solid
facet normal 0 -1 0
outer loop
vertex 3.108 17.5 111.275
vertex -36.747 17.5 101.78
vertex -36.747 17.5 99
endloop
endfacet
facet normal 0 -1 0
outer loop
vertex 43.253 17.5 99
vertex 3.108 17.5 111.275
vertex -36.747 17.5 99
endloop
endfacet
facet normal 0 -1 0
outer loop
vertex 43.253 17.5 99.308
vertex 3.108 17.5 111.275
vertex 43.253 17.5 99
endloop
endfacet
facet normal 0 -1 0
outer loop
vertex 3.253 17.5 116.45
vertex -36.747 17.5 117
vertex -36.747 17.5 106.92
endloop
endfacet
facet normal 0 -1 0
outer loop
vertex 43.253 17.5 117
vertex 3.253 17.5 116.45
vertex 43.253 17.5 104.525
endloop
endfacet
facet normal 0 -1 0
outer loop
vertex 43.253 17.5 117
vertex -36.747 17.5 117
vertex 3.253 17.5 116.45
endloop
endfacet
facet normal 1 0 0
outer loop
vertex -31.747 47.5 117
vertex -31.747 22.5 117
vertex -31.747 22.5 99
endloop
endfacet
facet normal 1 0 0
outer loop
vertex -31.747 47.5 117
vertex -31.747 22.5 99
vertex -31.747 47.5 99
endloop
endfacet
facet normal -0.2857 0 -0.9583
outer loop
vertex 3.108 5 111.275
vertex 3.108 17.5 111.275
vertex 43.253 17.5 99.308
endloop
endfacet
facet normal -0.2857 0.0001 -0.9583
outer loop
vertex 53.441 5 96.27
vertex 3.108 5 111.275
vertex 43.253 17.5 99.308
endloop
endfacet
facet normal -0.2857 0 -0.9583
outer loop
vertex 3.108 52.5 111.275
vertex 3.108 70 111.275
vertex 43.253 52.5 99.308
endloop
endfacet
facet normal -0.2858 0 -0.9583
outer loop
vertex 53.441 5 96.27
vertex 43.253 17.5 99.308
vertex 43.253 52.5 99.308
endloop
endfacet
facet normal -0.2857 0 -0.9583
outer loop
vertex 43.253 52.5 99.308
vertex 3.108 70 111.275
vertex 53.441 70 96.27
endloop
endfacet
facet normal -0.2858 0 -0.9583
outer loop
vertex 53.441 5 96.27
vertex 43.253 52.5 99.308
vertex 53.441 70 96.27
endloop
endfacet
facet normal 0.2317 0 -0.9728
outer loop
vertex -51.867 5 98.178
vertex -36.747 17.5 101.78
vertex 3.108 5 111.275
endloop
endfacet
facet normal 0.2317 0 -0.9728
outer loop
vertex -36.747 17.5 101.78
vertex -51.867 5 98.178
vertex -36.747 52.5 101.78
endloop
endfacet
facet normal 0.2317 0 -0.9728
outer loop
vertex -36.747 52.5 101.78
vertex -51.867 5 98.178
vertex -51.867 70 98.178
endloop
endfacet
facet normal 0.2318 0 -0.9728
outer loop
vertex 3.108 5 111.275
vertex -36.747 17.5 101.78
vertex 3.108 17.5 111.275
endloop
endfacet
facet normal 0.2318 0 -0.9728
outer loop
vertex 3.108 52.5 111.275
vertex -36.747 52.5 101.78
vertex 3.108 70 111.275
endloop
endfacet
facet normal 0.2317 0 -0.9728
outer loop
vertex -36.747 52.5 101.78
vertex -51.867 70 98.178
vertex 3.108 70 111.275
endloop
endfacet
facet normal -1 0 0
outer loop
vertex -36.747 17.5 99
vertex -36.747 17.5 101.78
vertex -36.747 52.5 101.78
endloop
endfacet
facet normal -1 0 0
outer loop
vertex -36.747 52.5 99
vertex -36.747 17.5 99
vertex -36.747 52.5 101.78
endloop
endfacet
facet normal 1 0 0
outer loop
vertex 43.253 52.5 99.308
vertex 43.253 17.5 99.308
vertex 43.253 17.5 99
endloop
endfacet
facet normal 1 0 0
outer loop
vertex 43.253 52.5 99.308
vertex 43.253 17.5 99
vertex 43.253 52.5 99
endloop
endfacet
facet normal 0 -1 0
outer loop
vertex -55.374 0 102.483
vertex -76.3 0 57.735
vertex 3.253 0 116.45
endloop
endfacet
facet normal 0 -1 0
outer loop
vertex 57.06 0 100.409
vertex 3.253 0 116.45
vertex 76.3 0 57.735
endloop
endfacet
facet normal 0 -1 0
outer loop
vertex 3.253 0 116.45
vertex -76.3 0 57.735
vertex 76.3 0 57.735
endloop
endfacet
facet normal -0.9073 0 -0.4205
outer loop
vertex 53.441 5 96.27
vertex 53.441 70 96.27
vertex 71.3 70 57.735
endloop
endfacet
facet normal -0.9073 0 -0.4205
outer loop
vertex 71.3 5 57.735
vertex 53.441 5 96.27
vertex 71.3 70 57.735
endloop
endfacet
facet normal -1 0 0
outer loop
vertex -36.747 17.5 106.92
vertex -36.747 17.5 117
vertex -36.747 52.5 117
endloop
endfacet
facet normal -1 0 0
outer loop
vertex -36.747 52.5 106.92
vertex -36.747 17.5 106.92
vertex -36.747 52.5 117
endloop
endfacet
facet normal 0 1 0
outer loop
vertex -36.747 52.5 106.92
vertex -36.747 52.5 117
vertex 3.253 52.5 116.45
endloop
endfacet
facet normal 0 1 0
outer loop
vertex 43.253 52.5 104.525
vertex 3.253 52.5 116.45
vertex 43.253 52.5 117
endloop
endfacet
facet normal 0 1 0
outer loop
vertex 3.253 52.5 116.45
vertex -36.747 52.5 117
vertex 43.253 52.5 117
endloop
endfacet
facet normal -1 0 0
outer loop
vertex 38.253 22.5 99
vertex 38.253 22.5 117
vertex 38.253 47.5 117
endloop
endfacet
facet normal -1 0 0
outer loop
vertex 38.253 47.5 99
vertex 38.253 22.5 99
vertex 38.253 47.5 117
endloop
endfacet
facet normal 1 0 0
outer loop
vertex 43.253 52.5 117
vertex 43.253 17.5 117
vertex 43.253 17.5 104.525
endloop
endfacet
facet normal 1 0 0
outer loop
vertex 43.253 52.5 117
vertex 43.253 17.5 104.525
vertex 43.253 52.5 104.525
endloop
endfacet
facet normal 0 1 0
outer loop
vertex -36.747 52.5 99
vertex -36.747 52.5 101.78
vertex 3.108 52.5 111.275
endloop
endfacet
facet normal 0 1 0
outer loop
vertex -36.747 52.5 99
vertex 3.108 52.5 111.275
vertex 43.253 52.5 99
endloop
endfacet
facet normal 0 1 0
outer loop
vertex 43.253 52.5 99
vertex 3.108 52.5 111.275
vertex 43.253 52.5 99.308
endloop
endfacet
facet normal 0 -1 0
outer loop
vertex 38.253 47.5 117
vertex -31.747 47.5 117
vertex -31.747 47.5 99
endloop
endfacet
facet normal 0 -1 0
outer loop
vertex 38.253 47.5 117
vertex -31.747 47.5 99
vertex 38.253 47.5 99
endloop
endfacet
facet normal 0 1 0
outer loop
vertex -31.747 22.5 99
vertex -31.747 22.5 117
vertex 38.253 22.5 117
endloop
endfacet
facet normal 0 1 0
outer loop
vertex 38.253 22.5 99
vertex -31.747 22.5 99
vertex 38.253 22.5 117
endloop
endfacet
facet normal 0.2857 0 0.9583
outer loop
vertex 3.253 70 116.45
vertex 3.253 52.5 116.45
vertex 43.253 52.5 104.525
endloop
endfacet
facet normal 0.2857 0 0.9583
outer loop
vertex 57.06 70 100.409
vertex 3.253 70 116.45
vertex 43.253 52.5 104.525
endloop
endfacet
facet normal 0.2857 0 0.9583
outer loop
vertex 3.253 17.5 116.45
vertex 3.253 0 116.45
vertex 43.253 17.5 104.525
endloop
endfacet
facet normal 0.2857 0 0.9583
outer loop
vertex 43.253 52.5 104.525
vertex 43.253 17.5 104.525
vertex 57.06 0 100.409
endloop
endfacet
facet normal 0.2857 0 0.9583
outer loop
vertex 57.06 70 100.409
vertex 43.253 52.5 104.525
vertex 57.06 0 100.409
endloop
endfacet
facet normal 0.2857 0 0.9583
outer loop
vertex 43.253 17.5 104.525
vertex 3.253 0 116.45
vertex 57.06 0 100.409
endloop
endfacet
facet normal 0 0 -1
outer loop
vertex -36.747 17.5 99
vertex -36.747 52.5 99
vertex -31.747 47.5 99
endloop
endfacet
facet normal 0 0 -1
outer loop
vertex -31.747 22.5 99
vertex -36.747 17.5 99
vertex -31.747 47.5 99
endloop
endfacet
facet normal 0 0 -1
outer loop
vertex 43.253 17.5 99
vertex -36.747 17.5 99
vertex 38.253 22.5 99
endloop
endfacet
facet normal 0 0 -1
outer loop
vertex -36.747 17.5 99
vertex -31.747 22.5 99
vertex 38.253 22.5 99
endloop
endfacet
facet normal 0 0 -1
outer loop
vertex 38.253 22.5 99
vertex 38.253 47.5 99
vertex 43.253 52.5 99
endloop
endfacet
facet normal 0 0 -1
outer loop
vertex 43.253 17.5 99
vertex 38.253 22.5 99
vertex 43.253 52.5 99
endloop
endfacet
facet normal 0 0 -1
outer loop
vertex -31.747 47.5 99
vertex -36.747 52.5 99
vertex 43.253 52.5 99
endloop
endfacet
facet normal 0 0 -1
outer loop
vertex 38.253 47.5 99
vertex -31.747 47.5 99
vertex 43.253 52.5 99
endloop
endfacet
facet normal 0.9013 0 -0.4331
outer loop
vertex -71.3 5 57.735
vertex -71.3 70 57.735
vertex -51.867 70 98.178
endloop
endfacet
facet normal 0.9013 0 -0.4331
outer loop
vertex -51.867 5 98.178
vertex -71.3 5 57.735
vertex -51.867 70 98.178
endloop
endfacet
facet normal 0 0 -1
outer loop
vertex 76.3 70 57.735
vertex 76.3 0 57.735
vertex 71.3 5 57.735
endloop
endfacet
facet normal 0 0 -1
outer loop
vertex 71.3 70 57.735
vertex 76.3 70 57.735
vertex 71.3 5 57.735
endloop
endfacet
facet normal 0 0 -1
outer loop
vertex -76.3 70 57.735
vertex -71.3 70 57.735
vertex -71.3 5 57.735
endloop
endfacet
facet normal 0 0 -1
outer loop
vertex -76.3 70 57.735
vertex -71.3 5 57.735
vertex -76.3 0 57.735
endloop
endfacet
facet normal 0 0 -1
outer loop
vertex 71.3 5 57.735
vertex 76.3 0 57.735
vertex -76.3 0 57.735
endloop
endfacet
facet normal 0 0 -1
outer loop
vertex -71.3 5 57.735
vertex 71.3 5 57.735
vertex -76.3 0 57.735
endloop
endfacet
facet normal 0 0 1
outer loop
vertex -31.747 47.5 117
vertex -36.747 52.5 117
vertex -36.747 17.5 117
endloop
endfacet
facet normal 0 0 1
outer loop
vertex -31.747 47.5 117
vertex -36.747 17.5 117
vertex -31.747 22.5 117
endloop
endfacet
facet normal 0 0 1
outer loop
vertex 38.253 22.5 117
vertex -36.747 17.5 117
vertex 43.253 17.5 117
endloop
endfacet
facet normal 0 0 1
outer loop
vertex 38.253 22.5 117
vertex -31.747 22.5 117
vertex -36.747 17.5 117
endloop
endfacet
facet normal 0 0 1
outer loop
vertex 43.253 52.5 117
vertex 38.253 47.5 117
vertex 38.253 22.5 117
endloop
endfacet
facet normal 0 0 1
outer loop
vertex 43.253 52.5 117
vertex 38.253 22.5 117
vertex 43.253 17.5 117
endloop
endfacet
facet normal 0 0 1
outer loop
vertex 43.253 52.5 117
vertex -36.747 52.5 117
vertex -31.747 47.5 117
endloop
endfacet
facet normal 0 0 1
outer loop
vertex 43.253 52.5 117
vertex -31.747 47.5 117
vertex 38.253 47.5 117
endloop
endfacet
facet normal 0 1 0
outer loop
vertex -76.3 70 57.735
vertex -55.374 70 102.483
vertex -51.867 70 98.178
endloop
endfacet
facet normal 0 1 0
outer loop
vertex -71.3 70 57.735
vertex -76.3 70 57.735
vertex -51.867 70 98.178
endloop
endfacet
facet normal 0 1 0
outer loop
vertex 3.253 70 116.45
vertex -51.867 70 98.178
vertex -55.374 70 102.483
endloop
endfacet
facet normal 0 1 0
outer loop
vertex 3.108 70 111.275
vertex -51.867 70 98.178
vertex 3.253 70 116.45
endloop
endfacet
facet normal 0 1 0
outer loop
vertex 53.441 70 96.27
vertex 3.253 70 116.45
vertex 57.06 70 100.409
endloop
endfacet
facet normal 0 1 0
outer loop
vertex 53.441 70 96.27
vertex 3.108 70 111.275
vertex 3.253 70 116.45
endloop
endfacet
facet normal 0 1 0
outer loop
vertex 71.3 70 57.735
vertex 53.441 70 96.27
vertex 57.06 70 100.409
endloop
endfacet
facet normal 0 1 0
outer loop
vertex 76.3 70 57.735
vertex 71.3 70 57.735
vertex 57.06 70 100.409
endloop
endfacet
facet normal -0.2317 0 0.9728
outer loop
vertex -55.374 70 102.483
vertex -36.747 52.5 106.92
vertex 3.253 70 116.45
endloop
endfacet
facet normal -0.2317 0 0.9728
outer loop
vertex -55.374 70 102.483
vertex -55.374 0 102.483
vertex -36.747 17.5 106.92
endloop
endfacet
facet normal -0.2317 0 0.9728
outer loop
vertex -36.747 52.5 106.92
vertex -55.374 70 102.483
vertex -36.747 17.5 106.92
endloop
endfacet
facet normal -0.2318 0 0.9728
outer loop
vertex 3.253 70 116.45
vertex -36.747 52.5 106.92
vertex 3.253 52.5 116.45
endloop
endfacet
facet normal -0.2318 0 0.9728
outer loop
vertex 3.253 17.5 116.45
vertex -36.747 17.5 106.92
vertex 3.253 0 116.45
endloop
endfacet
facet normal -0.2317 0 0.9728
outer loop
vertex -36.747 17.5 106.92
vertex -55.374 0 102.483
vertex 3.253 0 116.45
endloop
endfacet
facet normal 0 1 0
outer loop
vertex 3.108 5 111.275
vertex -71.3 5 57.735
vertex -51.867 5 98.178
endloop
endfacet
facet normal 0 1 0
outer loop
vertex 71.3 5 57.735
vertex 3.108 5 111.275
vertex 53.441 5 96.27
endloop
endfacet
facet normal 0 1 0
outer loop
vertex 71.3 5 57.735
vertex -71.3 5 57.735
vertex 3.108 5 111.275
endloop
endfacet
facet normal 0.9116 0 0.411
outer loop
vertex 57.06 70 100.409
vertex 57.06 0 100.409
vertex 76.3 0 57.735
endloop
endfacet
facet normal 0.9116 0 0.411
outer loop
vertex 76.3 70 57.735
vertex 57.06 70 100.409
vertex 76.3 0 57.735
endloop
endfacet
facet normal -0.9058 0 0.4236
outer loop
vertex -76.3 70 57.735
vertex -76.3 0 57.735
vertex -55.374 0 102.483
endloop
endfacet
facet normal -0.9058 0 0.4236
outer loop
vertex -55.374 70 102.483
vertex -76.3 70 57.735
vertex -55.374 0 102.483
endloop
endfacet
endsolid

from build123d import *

# Parameters (mm, degrees)
BOSS_EXTRUDE1_DEPTH = 70
CUT_EXTRUDE1_DEPTH  = 65
SKETCH5_W           = 80
SKETCH5_H           = 35
BOSS_EXTRUDE2_DEPTH = 18
SKETCH6_W           = 70
SKETCH6_H           = 25
CUT_EXTRUDE2_DEPTH  = 18


with BuildPart() as part:
    # Sketch1 → Boss-Extrude1 (new body)
    with BuildSketch(Plane(origin=(0, 0, 0), x_dir=(1, 0, 0), z_dir=(0, 1, 0))):
        Polygon((-55.37403033, -102.482648945), (3.252686078, -116.449526131), (57.060212297, -100.408827863), (76.3, -57.735026919), (-76.3, -57.735026919), align=None)
    extrude(amount=BOSS_EXTRUDE1_DEPTH)

    # Sketch4 → Cut-Extrude1 (cut)
    with BuildSketch(Plane(origin=(0, 70, 0), x_dir=(1, 0, 0), z_dir=(0, 1, 0))):
        Polygon((-51.867290581, -98.178143042), (3.108154981, -111.275163368), (53.44146669, -96.270172009), (71.3, -57.735026919), (-71.3, -57.735026919), align=None)
    extrude(amount=-CUT_EXTRUDE1_DEPTH, mode=Mode.SUBTRACT)

    # Sketch5 → Boss-Extrude2 (add)
    with BuildSketch(Plane.XY.offset(117)):
        with Locations((3.252686078, 35)):
            Rectangle(SKETCH5_W, SKETCH5_H)
    extrude(amount=-BOSS_EXTRUDE2_DEPTH)

    # Sketch6 → Cut-Extrude2 (cut)
    with BuildSketch(Plane.XY.offset(117)):
        with Locations((3.252686078, 35)):
            Rectangle(SKETCH6_W, SKETCH6_H)
    extrude(amount=-CUT_EXTRUDE2_DEPTH, mode=Mode.SUBTRACT)


solid = part.part
